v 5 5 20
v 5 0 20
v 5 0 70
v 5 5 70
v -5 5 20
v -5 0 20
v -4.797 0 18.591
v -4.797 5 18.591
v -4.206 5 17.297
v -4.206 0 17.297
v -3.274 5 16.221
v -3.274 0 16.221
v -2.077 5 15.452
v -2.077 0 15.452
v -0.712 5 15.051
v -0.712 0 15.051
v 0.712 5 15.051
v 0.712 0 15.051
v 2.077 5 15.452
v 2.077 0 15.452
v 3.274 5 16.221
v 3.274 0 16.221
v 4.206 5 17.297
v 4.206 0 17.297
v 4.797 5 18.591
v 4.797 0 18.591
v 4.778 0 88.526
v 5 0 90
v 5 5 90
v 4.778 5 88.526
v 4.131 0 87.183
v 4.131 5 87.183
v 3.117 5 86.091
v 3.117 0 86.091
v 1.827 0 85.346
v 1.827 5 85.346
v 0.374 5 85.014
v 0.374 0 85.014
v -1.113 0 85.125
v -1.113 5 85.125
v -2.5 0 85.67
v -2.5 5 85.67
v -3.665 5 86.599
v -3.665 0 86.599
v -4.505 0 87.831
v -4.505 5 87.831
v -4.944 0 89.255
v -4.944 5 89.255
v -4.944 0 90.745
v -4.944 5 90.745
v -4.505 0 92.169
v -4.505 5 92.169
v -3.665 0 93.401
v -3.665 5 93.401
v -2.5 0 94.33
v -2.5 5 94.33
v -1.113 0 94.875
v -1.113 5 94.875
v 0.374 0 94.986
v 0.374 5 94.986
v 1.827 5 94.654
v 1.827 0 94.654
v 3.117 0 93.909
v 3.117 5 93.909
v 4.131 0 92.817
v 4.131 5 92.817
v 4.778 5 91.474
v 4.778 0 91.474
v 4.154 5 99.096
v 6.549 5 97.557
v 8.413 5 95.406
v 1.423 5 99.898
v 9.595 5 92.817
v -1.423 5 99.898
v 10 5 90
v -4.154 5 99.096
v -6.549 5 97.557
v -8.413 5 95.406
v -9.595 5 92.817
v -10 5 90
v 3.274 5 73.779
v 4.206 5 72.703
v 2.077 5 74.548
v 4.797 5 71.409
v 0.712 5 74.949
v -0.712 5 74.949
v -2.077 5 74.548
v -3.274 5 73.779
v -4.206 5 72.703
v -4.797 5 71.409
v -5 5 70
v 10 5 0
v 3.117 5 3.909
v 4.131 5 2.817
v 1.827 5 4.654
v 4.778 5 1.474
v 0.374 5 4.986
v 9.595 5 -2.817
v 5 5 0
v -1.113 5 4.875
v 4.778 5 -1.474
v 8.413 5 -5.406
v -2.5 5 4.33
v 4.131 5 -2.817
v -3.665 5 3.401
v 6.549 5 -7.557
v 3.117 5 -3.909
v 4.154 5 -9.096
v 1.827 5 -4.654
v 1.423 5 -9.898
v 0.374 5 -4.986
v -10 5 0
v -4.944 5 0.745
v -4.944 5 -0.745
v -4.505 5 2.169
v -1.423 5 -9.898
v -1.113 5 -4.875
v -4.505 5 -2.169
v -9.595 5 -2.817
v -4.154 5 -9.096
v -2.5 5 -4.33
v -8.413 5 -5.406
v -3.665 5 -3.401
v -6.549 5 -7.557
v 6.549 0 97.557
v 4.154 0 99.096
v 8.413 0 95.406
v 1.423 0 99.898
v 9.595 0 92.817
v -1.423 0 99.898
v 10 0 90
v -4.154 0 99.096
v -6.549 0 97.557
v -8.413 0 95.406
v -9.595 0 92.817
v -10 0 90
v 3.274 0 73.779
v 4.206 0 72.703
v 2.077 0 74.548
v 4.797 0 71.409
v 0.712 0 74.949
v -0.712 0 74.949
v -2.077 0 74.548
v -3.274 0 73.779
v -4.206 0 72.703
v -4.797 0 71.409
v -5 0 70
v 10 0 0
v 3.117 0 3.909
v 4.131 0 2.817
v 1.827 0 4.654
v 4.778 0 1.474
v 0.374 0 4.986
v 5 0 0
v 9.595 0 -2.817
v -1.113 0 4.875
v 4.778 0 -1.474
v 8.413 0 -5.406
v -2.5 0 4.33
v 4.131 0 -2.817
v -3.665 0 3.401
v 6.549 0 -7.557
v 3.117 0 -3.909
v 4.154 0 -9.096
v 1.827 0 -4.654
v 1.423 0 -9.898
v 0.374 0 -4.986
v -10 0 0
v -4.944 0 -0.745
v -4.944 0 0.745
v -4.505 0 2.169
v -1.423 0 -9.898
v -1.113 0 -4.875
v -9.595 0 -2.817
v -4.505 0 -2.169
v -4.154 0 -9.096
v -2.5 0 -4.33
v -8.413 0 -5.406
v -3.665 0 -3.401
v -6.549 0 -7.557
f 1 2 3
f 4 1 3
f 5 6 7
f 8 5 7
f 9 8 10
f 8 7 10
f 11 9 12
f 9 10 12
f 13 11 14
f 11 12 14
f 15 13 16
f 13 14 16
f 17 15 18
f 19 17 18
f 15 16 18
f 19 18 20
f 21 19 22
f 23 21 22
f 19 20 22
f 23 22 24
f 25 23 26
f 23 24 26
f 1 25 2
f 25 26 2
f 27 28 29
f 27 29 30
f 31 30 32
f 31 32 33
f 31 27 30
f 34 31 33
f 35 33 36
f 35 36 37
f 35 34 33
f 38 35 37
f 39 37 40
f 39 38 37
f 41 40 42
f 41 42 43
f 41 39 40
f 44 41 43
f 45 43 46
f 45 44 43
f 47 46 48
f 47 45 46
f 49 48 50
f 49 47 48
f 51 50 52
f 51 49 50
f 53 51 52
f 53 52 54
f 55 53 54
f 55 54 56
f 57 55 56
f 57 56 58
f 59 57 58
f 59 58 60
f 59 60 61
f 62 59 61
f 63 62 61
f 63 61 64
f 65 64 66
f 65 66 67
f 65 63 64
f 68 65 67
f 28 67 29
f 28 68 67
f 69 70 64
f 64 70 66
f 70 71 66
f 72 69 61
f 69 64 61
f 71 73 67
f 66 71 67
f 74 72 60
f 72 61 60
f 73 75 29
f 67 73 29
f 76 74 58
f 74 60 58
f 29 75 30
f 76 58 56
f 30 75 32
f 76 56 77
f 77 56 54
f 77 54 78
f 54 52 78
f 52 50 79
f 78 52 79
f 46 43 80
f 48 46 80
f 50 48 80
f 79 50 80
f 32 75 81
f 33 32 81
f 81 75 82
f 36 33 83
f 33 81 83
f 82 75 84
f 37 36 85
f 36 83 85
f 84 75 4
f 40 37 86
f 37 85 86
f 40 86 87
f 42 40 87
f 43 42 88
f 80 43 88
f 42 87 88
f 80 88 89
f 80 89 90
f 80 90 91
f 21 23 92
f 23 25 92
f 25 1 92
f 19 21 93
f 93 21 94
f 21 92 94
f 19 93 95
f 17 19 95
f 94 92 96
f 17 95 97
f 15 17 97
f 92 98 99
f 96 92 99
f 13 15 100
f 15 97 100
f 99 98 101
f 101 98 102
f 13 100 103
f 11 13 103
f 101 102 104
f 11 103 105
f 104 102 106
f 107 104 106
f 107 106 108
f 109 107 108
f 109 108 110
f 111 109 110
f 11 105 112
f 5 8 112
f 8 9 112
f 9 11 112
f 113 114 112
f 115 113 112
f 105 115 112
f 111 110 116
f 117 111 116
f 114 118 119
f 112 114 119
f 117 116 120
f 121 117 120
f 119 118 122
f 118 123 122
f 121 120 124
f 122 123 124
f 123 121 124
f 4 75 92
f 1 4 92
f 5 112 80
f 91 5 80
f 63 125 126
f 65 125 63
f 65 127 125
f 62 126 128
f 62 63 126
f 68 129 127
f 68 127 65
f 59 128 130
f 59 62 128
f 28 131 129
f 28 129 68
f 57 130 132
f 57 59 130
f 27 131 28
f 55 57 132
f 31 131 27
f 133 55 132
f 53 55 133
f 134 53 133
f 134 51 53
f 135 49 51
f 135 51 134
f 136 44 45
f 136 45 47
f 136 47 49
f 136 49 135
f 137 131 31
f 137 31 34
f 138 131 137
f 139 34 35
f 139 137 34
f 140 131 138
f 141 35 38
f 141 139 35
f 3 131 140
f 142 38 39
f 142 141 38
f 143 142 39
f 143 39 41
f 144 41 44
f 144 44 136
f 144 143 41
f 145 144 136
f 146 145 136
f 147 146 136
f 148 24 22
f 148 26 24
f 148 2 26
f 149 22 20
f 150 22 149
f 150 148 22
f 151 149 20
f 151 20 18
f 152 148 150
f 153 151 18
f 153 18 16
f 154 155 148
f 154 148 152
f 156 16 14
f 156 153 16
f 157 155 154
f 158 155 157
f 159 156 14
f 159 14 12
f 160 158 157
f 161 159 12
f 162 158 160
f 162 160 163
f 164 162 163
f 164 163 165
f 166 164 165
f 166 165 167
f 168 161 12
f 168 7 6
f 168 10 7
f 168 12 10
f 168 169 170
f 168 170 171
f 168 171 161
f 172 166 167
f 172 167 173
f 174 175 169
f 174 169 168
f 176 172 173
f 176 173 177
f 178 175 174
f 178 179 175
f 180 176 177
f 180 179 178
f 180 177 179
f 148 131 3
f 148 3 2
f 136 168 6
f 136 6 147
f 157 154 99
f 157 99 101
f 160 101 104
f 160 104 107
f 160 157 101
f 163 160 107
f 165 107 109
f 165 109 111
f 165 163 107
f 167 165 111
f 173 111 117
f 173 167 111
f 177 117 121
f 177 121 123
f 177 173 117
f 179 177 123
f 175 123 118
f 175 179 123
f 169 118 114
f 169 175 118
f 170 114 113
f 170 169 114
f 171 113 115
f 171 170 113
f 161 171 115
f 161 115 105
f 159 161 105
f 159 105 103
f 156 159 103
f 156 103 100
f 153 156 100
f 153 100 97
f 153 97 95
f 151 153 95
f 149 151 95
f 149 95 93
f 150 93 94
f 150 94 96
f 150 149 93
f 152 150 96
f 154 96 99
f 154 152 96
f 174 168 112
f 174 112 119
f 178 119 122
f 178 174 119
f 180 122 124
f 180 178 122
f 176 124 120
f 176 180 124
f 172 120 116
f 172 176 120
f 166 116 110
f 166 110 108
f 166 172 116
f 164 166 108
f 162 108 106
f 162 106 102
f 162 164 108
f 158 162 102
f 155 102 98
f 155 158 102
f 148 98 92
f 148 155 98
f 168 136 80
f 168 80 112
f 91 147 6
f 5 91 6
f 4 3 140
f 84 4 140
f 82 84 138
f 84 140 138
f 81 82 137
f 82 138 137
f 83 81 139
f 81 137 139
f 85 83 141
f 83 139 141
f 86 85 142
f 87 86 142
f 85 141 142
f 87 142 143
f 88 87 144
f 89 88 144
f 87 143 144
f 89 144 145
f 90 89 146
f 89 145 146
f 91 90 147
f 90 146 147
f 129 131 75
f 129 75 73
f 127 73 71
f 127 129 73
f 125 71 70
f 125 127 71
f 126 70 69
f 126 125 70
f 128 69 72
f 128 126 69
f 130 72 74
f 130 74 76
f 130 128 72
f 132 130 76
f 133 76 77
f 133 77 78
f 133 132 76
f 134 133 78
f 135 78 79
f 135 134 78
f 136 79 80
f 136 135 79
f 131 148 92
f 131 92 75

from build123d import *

# Parameters (mm, degrees)
SKETCH1_R           = 5
BOSS_EXTRUDE1_DEPTH = 5


with BuildPart() as part:
    # Sketch1 → Boss-Extrude1 (new body)
    with BuildSketch(Plane(origin=(0, 0, 0), x_dir=(1, 0, 0), z_dir=(0, 1, 0))):
        with BuildLine():
            Line((10, 0), (10, -90))
            ThreePointArc((10, -90), (0, -100), (-10, -90))
            Line((-10, -90), (-10, 0))
            ThreePointArc((-10, 0), (0, 10), (10, 0))
        make_face()
        Circle(SKETCH1_R, mode=Mode.SUBTRACT)
        with Locations((0, -90)):
            Circle(SKETCH1_R, mode=Mode.SUBTRACT)
        with BuildLine():
            Line((5, -20), (5, -70))
            ThreePointArc((5, -70), (0, -75), (-5, -70))
            Line((-5, -70), (-5, -20))
            ThreePointArc((-5, -20), (0, -15), (5, -20))
        make_face(mode=Mode.SUBTRACT)
    extrude(amount=BOSS_EXTRUDE1_DEPTH)


solid = part.part
